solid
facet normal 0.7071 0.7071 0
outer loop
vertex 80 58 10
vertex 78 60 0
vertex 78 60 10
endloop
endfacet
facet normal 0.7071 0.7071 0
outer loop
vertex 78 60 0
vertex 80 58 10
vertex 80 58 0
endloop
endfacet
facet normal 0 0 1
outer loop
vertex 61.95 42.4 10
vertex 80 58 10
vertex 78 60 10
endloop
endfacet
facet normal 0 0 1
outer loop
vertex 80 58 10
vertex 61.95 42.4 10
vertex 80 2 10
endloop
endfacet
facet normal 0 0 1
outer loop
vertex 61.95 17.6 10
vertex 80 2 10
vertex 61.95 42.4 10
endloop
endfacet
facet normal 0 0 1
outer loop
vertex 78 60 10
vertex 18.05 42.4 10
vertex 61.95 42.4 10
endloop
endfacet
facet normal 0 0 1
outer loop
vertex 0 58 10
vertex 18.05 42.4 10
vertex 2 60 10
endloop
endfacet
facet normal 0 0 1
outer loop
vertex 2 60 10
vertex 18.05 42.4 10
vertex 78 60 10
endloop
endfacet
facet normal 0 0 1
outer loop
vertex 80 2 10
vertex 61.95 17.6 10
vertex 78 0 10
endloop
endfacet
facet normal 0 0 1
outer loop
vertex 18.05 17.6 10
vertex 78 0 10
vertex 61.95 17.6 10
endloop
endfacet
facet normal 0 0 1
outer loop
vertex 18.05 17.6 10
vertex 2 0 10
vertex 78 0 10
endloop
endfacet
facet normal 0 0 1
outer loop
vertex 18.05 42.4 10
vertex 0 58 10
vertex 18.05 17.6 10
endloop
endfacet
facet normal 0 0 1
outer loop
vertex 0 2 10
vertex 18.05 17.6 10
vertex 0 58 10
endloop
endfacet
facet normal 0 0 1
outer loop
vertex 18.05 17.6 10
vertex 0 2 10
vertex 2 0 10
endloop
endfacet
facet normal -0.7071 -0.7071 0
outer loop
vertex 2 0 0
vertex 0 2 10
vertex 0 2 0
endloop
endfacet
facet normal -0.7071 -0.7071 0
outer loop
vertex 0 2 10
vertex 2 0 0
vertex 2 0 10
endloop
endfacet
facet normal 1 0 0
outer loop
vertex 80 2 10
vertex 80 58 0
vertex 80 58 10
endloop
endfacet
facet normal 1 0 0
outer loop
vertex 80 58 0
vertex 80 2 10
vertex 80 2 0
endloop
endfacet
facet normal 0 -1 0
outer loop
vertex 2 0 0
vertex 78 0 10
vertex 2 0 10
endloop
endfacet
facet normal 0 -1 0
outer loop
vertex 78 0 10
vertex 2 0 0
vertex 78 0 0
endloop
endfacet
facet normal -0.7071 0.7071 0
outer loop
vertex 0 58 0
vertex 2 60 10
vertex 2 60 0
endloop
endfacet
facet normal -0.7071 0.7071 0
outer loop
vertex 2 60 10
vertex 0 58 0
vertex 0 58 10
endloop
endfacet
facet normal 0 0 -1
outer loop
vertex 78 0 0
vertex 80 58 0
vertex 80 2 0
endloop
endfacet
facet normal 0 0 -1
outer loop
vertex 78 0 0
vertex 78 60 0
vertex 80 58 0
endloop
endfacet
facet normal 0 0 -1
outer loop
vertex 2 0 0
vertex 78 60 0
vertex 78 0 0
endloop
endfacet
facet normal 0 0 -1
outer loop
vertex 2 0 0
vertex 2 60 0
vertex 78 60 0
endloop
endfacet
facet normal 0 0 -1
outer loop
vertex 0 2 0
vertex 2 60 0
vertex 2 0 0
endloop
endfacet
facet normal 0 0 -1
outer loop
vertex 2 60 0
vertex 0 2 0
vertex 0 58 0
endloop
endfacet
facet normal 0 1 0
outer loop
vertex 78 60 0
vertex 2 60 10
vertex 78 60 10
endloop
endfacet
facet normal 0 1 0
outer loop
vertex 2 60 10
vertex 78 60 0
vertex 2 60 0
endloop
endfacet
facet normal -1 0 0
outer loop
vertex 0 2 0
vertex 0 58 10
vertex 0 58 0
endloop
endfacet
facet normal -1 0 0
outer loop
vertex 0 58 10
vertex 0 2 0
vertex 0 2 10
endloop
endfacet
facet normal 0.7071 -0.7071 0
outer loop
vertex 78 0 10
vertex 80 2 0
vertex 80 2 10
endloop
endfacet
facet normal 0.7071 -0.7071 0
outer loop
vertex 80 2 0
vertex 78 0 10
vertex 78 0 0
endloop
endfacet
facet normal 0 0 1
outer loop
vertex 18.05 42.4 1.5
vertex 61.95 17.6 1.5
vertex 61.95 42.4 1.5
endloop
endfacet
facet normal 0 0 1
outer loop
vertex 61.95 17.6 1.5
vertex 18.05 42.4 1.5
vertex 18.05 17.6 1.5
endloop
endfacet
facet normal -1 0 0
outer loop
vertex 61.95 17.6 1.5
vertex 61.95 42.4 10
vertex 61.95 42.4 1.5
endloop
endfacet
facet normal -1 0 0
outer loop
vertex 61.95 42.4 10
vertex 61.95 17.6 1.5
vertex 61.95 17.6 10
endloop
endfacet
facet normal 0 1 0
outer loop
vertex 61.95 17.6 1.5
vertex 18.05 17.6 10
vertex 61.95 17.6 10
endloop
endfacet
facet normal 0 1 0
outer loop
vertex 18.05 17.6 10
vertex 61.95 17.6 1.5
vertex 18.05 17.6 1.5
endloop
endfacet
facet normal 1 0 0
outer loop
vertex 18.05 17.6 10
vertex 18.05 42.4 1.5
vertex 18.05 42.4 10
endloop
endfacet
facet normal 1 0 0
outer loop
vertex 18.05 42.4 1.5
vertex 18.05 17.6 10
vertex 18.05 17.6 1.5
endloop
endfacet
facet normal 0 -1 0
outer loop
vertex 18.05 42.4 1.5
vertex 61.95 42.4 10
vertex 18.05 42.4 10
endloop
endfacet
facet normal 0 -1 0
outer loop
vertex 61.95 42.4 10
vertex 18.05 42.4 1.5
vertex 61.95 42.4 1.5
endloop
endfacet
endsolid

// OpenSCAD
$fn = 32;

// ----------------------------------------------------------------------
// Windowed plate: 1 voids, 80 x 60 x 10 mm
// ----------------------------------------------------------------------

// --- parameters (mm) ---
plate_l = 80;             // plate length, X
plate_w = 60;             // plate width, Y
plate_t = 10;             // plate thickness, Z
edge_margin = 12;         // wall from the plate edge to any window
win1_l = 43.9;            // window length
win1_w = 24.8;            // window width
depth_1 = 8.5;            // depth of void 1 (full thickness = through)
corner_c = 2;             // corner chamfer of the plate

profile = [[2, 0], [78, 0], [80, 2], [80, 58], [78, 60], [2, 60], [0, 58], [0, 2]];  // primary outline, 8 points, counter clockwise
void_1 = [[18.05, 17.6], [61.95, 17.6], [61.95, 42.4], [18.05, 42.4]];  // large central window, 4 points

// --- the one profile operation ---
difference() {
  linear_extrude(height = plate_t) polygon(points = profile);
  translate([0, 0, plate_t - depth_1])
    linear_extrude(height = depth_1 + 1) polygon(points = void_1);
}
